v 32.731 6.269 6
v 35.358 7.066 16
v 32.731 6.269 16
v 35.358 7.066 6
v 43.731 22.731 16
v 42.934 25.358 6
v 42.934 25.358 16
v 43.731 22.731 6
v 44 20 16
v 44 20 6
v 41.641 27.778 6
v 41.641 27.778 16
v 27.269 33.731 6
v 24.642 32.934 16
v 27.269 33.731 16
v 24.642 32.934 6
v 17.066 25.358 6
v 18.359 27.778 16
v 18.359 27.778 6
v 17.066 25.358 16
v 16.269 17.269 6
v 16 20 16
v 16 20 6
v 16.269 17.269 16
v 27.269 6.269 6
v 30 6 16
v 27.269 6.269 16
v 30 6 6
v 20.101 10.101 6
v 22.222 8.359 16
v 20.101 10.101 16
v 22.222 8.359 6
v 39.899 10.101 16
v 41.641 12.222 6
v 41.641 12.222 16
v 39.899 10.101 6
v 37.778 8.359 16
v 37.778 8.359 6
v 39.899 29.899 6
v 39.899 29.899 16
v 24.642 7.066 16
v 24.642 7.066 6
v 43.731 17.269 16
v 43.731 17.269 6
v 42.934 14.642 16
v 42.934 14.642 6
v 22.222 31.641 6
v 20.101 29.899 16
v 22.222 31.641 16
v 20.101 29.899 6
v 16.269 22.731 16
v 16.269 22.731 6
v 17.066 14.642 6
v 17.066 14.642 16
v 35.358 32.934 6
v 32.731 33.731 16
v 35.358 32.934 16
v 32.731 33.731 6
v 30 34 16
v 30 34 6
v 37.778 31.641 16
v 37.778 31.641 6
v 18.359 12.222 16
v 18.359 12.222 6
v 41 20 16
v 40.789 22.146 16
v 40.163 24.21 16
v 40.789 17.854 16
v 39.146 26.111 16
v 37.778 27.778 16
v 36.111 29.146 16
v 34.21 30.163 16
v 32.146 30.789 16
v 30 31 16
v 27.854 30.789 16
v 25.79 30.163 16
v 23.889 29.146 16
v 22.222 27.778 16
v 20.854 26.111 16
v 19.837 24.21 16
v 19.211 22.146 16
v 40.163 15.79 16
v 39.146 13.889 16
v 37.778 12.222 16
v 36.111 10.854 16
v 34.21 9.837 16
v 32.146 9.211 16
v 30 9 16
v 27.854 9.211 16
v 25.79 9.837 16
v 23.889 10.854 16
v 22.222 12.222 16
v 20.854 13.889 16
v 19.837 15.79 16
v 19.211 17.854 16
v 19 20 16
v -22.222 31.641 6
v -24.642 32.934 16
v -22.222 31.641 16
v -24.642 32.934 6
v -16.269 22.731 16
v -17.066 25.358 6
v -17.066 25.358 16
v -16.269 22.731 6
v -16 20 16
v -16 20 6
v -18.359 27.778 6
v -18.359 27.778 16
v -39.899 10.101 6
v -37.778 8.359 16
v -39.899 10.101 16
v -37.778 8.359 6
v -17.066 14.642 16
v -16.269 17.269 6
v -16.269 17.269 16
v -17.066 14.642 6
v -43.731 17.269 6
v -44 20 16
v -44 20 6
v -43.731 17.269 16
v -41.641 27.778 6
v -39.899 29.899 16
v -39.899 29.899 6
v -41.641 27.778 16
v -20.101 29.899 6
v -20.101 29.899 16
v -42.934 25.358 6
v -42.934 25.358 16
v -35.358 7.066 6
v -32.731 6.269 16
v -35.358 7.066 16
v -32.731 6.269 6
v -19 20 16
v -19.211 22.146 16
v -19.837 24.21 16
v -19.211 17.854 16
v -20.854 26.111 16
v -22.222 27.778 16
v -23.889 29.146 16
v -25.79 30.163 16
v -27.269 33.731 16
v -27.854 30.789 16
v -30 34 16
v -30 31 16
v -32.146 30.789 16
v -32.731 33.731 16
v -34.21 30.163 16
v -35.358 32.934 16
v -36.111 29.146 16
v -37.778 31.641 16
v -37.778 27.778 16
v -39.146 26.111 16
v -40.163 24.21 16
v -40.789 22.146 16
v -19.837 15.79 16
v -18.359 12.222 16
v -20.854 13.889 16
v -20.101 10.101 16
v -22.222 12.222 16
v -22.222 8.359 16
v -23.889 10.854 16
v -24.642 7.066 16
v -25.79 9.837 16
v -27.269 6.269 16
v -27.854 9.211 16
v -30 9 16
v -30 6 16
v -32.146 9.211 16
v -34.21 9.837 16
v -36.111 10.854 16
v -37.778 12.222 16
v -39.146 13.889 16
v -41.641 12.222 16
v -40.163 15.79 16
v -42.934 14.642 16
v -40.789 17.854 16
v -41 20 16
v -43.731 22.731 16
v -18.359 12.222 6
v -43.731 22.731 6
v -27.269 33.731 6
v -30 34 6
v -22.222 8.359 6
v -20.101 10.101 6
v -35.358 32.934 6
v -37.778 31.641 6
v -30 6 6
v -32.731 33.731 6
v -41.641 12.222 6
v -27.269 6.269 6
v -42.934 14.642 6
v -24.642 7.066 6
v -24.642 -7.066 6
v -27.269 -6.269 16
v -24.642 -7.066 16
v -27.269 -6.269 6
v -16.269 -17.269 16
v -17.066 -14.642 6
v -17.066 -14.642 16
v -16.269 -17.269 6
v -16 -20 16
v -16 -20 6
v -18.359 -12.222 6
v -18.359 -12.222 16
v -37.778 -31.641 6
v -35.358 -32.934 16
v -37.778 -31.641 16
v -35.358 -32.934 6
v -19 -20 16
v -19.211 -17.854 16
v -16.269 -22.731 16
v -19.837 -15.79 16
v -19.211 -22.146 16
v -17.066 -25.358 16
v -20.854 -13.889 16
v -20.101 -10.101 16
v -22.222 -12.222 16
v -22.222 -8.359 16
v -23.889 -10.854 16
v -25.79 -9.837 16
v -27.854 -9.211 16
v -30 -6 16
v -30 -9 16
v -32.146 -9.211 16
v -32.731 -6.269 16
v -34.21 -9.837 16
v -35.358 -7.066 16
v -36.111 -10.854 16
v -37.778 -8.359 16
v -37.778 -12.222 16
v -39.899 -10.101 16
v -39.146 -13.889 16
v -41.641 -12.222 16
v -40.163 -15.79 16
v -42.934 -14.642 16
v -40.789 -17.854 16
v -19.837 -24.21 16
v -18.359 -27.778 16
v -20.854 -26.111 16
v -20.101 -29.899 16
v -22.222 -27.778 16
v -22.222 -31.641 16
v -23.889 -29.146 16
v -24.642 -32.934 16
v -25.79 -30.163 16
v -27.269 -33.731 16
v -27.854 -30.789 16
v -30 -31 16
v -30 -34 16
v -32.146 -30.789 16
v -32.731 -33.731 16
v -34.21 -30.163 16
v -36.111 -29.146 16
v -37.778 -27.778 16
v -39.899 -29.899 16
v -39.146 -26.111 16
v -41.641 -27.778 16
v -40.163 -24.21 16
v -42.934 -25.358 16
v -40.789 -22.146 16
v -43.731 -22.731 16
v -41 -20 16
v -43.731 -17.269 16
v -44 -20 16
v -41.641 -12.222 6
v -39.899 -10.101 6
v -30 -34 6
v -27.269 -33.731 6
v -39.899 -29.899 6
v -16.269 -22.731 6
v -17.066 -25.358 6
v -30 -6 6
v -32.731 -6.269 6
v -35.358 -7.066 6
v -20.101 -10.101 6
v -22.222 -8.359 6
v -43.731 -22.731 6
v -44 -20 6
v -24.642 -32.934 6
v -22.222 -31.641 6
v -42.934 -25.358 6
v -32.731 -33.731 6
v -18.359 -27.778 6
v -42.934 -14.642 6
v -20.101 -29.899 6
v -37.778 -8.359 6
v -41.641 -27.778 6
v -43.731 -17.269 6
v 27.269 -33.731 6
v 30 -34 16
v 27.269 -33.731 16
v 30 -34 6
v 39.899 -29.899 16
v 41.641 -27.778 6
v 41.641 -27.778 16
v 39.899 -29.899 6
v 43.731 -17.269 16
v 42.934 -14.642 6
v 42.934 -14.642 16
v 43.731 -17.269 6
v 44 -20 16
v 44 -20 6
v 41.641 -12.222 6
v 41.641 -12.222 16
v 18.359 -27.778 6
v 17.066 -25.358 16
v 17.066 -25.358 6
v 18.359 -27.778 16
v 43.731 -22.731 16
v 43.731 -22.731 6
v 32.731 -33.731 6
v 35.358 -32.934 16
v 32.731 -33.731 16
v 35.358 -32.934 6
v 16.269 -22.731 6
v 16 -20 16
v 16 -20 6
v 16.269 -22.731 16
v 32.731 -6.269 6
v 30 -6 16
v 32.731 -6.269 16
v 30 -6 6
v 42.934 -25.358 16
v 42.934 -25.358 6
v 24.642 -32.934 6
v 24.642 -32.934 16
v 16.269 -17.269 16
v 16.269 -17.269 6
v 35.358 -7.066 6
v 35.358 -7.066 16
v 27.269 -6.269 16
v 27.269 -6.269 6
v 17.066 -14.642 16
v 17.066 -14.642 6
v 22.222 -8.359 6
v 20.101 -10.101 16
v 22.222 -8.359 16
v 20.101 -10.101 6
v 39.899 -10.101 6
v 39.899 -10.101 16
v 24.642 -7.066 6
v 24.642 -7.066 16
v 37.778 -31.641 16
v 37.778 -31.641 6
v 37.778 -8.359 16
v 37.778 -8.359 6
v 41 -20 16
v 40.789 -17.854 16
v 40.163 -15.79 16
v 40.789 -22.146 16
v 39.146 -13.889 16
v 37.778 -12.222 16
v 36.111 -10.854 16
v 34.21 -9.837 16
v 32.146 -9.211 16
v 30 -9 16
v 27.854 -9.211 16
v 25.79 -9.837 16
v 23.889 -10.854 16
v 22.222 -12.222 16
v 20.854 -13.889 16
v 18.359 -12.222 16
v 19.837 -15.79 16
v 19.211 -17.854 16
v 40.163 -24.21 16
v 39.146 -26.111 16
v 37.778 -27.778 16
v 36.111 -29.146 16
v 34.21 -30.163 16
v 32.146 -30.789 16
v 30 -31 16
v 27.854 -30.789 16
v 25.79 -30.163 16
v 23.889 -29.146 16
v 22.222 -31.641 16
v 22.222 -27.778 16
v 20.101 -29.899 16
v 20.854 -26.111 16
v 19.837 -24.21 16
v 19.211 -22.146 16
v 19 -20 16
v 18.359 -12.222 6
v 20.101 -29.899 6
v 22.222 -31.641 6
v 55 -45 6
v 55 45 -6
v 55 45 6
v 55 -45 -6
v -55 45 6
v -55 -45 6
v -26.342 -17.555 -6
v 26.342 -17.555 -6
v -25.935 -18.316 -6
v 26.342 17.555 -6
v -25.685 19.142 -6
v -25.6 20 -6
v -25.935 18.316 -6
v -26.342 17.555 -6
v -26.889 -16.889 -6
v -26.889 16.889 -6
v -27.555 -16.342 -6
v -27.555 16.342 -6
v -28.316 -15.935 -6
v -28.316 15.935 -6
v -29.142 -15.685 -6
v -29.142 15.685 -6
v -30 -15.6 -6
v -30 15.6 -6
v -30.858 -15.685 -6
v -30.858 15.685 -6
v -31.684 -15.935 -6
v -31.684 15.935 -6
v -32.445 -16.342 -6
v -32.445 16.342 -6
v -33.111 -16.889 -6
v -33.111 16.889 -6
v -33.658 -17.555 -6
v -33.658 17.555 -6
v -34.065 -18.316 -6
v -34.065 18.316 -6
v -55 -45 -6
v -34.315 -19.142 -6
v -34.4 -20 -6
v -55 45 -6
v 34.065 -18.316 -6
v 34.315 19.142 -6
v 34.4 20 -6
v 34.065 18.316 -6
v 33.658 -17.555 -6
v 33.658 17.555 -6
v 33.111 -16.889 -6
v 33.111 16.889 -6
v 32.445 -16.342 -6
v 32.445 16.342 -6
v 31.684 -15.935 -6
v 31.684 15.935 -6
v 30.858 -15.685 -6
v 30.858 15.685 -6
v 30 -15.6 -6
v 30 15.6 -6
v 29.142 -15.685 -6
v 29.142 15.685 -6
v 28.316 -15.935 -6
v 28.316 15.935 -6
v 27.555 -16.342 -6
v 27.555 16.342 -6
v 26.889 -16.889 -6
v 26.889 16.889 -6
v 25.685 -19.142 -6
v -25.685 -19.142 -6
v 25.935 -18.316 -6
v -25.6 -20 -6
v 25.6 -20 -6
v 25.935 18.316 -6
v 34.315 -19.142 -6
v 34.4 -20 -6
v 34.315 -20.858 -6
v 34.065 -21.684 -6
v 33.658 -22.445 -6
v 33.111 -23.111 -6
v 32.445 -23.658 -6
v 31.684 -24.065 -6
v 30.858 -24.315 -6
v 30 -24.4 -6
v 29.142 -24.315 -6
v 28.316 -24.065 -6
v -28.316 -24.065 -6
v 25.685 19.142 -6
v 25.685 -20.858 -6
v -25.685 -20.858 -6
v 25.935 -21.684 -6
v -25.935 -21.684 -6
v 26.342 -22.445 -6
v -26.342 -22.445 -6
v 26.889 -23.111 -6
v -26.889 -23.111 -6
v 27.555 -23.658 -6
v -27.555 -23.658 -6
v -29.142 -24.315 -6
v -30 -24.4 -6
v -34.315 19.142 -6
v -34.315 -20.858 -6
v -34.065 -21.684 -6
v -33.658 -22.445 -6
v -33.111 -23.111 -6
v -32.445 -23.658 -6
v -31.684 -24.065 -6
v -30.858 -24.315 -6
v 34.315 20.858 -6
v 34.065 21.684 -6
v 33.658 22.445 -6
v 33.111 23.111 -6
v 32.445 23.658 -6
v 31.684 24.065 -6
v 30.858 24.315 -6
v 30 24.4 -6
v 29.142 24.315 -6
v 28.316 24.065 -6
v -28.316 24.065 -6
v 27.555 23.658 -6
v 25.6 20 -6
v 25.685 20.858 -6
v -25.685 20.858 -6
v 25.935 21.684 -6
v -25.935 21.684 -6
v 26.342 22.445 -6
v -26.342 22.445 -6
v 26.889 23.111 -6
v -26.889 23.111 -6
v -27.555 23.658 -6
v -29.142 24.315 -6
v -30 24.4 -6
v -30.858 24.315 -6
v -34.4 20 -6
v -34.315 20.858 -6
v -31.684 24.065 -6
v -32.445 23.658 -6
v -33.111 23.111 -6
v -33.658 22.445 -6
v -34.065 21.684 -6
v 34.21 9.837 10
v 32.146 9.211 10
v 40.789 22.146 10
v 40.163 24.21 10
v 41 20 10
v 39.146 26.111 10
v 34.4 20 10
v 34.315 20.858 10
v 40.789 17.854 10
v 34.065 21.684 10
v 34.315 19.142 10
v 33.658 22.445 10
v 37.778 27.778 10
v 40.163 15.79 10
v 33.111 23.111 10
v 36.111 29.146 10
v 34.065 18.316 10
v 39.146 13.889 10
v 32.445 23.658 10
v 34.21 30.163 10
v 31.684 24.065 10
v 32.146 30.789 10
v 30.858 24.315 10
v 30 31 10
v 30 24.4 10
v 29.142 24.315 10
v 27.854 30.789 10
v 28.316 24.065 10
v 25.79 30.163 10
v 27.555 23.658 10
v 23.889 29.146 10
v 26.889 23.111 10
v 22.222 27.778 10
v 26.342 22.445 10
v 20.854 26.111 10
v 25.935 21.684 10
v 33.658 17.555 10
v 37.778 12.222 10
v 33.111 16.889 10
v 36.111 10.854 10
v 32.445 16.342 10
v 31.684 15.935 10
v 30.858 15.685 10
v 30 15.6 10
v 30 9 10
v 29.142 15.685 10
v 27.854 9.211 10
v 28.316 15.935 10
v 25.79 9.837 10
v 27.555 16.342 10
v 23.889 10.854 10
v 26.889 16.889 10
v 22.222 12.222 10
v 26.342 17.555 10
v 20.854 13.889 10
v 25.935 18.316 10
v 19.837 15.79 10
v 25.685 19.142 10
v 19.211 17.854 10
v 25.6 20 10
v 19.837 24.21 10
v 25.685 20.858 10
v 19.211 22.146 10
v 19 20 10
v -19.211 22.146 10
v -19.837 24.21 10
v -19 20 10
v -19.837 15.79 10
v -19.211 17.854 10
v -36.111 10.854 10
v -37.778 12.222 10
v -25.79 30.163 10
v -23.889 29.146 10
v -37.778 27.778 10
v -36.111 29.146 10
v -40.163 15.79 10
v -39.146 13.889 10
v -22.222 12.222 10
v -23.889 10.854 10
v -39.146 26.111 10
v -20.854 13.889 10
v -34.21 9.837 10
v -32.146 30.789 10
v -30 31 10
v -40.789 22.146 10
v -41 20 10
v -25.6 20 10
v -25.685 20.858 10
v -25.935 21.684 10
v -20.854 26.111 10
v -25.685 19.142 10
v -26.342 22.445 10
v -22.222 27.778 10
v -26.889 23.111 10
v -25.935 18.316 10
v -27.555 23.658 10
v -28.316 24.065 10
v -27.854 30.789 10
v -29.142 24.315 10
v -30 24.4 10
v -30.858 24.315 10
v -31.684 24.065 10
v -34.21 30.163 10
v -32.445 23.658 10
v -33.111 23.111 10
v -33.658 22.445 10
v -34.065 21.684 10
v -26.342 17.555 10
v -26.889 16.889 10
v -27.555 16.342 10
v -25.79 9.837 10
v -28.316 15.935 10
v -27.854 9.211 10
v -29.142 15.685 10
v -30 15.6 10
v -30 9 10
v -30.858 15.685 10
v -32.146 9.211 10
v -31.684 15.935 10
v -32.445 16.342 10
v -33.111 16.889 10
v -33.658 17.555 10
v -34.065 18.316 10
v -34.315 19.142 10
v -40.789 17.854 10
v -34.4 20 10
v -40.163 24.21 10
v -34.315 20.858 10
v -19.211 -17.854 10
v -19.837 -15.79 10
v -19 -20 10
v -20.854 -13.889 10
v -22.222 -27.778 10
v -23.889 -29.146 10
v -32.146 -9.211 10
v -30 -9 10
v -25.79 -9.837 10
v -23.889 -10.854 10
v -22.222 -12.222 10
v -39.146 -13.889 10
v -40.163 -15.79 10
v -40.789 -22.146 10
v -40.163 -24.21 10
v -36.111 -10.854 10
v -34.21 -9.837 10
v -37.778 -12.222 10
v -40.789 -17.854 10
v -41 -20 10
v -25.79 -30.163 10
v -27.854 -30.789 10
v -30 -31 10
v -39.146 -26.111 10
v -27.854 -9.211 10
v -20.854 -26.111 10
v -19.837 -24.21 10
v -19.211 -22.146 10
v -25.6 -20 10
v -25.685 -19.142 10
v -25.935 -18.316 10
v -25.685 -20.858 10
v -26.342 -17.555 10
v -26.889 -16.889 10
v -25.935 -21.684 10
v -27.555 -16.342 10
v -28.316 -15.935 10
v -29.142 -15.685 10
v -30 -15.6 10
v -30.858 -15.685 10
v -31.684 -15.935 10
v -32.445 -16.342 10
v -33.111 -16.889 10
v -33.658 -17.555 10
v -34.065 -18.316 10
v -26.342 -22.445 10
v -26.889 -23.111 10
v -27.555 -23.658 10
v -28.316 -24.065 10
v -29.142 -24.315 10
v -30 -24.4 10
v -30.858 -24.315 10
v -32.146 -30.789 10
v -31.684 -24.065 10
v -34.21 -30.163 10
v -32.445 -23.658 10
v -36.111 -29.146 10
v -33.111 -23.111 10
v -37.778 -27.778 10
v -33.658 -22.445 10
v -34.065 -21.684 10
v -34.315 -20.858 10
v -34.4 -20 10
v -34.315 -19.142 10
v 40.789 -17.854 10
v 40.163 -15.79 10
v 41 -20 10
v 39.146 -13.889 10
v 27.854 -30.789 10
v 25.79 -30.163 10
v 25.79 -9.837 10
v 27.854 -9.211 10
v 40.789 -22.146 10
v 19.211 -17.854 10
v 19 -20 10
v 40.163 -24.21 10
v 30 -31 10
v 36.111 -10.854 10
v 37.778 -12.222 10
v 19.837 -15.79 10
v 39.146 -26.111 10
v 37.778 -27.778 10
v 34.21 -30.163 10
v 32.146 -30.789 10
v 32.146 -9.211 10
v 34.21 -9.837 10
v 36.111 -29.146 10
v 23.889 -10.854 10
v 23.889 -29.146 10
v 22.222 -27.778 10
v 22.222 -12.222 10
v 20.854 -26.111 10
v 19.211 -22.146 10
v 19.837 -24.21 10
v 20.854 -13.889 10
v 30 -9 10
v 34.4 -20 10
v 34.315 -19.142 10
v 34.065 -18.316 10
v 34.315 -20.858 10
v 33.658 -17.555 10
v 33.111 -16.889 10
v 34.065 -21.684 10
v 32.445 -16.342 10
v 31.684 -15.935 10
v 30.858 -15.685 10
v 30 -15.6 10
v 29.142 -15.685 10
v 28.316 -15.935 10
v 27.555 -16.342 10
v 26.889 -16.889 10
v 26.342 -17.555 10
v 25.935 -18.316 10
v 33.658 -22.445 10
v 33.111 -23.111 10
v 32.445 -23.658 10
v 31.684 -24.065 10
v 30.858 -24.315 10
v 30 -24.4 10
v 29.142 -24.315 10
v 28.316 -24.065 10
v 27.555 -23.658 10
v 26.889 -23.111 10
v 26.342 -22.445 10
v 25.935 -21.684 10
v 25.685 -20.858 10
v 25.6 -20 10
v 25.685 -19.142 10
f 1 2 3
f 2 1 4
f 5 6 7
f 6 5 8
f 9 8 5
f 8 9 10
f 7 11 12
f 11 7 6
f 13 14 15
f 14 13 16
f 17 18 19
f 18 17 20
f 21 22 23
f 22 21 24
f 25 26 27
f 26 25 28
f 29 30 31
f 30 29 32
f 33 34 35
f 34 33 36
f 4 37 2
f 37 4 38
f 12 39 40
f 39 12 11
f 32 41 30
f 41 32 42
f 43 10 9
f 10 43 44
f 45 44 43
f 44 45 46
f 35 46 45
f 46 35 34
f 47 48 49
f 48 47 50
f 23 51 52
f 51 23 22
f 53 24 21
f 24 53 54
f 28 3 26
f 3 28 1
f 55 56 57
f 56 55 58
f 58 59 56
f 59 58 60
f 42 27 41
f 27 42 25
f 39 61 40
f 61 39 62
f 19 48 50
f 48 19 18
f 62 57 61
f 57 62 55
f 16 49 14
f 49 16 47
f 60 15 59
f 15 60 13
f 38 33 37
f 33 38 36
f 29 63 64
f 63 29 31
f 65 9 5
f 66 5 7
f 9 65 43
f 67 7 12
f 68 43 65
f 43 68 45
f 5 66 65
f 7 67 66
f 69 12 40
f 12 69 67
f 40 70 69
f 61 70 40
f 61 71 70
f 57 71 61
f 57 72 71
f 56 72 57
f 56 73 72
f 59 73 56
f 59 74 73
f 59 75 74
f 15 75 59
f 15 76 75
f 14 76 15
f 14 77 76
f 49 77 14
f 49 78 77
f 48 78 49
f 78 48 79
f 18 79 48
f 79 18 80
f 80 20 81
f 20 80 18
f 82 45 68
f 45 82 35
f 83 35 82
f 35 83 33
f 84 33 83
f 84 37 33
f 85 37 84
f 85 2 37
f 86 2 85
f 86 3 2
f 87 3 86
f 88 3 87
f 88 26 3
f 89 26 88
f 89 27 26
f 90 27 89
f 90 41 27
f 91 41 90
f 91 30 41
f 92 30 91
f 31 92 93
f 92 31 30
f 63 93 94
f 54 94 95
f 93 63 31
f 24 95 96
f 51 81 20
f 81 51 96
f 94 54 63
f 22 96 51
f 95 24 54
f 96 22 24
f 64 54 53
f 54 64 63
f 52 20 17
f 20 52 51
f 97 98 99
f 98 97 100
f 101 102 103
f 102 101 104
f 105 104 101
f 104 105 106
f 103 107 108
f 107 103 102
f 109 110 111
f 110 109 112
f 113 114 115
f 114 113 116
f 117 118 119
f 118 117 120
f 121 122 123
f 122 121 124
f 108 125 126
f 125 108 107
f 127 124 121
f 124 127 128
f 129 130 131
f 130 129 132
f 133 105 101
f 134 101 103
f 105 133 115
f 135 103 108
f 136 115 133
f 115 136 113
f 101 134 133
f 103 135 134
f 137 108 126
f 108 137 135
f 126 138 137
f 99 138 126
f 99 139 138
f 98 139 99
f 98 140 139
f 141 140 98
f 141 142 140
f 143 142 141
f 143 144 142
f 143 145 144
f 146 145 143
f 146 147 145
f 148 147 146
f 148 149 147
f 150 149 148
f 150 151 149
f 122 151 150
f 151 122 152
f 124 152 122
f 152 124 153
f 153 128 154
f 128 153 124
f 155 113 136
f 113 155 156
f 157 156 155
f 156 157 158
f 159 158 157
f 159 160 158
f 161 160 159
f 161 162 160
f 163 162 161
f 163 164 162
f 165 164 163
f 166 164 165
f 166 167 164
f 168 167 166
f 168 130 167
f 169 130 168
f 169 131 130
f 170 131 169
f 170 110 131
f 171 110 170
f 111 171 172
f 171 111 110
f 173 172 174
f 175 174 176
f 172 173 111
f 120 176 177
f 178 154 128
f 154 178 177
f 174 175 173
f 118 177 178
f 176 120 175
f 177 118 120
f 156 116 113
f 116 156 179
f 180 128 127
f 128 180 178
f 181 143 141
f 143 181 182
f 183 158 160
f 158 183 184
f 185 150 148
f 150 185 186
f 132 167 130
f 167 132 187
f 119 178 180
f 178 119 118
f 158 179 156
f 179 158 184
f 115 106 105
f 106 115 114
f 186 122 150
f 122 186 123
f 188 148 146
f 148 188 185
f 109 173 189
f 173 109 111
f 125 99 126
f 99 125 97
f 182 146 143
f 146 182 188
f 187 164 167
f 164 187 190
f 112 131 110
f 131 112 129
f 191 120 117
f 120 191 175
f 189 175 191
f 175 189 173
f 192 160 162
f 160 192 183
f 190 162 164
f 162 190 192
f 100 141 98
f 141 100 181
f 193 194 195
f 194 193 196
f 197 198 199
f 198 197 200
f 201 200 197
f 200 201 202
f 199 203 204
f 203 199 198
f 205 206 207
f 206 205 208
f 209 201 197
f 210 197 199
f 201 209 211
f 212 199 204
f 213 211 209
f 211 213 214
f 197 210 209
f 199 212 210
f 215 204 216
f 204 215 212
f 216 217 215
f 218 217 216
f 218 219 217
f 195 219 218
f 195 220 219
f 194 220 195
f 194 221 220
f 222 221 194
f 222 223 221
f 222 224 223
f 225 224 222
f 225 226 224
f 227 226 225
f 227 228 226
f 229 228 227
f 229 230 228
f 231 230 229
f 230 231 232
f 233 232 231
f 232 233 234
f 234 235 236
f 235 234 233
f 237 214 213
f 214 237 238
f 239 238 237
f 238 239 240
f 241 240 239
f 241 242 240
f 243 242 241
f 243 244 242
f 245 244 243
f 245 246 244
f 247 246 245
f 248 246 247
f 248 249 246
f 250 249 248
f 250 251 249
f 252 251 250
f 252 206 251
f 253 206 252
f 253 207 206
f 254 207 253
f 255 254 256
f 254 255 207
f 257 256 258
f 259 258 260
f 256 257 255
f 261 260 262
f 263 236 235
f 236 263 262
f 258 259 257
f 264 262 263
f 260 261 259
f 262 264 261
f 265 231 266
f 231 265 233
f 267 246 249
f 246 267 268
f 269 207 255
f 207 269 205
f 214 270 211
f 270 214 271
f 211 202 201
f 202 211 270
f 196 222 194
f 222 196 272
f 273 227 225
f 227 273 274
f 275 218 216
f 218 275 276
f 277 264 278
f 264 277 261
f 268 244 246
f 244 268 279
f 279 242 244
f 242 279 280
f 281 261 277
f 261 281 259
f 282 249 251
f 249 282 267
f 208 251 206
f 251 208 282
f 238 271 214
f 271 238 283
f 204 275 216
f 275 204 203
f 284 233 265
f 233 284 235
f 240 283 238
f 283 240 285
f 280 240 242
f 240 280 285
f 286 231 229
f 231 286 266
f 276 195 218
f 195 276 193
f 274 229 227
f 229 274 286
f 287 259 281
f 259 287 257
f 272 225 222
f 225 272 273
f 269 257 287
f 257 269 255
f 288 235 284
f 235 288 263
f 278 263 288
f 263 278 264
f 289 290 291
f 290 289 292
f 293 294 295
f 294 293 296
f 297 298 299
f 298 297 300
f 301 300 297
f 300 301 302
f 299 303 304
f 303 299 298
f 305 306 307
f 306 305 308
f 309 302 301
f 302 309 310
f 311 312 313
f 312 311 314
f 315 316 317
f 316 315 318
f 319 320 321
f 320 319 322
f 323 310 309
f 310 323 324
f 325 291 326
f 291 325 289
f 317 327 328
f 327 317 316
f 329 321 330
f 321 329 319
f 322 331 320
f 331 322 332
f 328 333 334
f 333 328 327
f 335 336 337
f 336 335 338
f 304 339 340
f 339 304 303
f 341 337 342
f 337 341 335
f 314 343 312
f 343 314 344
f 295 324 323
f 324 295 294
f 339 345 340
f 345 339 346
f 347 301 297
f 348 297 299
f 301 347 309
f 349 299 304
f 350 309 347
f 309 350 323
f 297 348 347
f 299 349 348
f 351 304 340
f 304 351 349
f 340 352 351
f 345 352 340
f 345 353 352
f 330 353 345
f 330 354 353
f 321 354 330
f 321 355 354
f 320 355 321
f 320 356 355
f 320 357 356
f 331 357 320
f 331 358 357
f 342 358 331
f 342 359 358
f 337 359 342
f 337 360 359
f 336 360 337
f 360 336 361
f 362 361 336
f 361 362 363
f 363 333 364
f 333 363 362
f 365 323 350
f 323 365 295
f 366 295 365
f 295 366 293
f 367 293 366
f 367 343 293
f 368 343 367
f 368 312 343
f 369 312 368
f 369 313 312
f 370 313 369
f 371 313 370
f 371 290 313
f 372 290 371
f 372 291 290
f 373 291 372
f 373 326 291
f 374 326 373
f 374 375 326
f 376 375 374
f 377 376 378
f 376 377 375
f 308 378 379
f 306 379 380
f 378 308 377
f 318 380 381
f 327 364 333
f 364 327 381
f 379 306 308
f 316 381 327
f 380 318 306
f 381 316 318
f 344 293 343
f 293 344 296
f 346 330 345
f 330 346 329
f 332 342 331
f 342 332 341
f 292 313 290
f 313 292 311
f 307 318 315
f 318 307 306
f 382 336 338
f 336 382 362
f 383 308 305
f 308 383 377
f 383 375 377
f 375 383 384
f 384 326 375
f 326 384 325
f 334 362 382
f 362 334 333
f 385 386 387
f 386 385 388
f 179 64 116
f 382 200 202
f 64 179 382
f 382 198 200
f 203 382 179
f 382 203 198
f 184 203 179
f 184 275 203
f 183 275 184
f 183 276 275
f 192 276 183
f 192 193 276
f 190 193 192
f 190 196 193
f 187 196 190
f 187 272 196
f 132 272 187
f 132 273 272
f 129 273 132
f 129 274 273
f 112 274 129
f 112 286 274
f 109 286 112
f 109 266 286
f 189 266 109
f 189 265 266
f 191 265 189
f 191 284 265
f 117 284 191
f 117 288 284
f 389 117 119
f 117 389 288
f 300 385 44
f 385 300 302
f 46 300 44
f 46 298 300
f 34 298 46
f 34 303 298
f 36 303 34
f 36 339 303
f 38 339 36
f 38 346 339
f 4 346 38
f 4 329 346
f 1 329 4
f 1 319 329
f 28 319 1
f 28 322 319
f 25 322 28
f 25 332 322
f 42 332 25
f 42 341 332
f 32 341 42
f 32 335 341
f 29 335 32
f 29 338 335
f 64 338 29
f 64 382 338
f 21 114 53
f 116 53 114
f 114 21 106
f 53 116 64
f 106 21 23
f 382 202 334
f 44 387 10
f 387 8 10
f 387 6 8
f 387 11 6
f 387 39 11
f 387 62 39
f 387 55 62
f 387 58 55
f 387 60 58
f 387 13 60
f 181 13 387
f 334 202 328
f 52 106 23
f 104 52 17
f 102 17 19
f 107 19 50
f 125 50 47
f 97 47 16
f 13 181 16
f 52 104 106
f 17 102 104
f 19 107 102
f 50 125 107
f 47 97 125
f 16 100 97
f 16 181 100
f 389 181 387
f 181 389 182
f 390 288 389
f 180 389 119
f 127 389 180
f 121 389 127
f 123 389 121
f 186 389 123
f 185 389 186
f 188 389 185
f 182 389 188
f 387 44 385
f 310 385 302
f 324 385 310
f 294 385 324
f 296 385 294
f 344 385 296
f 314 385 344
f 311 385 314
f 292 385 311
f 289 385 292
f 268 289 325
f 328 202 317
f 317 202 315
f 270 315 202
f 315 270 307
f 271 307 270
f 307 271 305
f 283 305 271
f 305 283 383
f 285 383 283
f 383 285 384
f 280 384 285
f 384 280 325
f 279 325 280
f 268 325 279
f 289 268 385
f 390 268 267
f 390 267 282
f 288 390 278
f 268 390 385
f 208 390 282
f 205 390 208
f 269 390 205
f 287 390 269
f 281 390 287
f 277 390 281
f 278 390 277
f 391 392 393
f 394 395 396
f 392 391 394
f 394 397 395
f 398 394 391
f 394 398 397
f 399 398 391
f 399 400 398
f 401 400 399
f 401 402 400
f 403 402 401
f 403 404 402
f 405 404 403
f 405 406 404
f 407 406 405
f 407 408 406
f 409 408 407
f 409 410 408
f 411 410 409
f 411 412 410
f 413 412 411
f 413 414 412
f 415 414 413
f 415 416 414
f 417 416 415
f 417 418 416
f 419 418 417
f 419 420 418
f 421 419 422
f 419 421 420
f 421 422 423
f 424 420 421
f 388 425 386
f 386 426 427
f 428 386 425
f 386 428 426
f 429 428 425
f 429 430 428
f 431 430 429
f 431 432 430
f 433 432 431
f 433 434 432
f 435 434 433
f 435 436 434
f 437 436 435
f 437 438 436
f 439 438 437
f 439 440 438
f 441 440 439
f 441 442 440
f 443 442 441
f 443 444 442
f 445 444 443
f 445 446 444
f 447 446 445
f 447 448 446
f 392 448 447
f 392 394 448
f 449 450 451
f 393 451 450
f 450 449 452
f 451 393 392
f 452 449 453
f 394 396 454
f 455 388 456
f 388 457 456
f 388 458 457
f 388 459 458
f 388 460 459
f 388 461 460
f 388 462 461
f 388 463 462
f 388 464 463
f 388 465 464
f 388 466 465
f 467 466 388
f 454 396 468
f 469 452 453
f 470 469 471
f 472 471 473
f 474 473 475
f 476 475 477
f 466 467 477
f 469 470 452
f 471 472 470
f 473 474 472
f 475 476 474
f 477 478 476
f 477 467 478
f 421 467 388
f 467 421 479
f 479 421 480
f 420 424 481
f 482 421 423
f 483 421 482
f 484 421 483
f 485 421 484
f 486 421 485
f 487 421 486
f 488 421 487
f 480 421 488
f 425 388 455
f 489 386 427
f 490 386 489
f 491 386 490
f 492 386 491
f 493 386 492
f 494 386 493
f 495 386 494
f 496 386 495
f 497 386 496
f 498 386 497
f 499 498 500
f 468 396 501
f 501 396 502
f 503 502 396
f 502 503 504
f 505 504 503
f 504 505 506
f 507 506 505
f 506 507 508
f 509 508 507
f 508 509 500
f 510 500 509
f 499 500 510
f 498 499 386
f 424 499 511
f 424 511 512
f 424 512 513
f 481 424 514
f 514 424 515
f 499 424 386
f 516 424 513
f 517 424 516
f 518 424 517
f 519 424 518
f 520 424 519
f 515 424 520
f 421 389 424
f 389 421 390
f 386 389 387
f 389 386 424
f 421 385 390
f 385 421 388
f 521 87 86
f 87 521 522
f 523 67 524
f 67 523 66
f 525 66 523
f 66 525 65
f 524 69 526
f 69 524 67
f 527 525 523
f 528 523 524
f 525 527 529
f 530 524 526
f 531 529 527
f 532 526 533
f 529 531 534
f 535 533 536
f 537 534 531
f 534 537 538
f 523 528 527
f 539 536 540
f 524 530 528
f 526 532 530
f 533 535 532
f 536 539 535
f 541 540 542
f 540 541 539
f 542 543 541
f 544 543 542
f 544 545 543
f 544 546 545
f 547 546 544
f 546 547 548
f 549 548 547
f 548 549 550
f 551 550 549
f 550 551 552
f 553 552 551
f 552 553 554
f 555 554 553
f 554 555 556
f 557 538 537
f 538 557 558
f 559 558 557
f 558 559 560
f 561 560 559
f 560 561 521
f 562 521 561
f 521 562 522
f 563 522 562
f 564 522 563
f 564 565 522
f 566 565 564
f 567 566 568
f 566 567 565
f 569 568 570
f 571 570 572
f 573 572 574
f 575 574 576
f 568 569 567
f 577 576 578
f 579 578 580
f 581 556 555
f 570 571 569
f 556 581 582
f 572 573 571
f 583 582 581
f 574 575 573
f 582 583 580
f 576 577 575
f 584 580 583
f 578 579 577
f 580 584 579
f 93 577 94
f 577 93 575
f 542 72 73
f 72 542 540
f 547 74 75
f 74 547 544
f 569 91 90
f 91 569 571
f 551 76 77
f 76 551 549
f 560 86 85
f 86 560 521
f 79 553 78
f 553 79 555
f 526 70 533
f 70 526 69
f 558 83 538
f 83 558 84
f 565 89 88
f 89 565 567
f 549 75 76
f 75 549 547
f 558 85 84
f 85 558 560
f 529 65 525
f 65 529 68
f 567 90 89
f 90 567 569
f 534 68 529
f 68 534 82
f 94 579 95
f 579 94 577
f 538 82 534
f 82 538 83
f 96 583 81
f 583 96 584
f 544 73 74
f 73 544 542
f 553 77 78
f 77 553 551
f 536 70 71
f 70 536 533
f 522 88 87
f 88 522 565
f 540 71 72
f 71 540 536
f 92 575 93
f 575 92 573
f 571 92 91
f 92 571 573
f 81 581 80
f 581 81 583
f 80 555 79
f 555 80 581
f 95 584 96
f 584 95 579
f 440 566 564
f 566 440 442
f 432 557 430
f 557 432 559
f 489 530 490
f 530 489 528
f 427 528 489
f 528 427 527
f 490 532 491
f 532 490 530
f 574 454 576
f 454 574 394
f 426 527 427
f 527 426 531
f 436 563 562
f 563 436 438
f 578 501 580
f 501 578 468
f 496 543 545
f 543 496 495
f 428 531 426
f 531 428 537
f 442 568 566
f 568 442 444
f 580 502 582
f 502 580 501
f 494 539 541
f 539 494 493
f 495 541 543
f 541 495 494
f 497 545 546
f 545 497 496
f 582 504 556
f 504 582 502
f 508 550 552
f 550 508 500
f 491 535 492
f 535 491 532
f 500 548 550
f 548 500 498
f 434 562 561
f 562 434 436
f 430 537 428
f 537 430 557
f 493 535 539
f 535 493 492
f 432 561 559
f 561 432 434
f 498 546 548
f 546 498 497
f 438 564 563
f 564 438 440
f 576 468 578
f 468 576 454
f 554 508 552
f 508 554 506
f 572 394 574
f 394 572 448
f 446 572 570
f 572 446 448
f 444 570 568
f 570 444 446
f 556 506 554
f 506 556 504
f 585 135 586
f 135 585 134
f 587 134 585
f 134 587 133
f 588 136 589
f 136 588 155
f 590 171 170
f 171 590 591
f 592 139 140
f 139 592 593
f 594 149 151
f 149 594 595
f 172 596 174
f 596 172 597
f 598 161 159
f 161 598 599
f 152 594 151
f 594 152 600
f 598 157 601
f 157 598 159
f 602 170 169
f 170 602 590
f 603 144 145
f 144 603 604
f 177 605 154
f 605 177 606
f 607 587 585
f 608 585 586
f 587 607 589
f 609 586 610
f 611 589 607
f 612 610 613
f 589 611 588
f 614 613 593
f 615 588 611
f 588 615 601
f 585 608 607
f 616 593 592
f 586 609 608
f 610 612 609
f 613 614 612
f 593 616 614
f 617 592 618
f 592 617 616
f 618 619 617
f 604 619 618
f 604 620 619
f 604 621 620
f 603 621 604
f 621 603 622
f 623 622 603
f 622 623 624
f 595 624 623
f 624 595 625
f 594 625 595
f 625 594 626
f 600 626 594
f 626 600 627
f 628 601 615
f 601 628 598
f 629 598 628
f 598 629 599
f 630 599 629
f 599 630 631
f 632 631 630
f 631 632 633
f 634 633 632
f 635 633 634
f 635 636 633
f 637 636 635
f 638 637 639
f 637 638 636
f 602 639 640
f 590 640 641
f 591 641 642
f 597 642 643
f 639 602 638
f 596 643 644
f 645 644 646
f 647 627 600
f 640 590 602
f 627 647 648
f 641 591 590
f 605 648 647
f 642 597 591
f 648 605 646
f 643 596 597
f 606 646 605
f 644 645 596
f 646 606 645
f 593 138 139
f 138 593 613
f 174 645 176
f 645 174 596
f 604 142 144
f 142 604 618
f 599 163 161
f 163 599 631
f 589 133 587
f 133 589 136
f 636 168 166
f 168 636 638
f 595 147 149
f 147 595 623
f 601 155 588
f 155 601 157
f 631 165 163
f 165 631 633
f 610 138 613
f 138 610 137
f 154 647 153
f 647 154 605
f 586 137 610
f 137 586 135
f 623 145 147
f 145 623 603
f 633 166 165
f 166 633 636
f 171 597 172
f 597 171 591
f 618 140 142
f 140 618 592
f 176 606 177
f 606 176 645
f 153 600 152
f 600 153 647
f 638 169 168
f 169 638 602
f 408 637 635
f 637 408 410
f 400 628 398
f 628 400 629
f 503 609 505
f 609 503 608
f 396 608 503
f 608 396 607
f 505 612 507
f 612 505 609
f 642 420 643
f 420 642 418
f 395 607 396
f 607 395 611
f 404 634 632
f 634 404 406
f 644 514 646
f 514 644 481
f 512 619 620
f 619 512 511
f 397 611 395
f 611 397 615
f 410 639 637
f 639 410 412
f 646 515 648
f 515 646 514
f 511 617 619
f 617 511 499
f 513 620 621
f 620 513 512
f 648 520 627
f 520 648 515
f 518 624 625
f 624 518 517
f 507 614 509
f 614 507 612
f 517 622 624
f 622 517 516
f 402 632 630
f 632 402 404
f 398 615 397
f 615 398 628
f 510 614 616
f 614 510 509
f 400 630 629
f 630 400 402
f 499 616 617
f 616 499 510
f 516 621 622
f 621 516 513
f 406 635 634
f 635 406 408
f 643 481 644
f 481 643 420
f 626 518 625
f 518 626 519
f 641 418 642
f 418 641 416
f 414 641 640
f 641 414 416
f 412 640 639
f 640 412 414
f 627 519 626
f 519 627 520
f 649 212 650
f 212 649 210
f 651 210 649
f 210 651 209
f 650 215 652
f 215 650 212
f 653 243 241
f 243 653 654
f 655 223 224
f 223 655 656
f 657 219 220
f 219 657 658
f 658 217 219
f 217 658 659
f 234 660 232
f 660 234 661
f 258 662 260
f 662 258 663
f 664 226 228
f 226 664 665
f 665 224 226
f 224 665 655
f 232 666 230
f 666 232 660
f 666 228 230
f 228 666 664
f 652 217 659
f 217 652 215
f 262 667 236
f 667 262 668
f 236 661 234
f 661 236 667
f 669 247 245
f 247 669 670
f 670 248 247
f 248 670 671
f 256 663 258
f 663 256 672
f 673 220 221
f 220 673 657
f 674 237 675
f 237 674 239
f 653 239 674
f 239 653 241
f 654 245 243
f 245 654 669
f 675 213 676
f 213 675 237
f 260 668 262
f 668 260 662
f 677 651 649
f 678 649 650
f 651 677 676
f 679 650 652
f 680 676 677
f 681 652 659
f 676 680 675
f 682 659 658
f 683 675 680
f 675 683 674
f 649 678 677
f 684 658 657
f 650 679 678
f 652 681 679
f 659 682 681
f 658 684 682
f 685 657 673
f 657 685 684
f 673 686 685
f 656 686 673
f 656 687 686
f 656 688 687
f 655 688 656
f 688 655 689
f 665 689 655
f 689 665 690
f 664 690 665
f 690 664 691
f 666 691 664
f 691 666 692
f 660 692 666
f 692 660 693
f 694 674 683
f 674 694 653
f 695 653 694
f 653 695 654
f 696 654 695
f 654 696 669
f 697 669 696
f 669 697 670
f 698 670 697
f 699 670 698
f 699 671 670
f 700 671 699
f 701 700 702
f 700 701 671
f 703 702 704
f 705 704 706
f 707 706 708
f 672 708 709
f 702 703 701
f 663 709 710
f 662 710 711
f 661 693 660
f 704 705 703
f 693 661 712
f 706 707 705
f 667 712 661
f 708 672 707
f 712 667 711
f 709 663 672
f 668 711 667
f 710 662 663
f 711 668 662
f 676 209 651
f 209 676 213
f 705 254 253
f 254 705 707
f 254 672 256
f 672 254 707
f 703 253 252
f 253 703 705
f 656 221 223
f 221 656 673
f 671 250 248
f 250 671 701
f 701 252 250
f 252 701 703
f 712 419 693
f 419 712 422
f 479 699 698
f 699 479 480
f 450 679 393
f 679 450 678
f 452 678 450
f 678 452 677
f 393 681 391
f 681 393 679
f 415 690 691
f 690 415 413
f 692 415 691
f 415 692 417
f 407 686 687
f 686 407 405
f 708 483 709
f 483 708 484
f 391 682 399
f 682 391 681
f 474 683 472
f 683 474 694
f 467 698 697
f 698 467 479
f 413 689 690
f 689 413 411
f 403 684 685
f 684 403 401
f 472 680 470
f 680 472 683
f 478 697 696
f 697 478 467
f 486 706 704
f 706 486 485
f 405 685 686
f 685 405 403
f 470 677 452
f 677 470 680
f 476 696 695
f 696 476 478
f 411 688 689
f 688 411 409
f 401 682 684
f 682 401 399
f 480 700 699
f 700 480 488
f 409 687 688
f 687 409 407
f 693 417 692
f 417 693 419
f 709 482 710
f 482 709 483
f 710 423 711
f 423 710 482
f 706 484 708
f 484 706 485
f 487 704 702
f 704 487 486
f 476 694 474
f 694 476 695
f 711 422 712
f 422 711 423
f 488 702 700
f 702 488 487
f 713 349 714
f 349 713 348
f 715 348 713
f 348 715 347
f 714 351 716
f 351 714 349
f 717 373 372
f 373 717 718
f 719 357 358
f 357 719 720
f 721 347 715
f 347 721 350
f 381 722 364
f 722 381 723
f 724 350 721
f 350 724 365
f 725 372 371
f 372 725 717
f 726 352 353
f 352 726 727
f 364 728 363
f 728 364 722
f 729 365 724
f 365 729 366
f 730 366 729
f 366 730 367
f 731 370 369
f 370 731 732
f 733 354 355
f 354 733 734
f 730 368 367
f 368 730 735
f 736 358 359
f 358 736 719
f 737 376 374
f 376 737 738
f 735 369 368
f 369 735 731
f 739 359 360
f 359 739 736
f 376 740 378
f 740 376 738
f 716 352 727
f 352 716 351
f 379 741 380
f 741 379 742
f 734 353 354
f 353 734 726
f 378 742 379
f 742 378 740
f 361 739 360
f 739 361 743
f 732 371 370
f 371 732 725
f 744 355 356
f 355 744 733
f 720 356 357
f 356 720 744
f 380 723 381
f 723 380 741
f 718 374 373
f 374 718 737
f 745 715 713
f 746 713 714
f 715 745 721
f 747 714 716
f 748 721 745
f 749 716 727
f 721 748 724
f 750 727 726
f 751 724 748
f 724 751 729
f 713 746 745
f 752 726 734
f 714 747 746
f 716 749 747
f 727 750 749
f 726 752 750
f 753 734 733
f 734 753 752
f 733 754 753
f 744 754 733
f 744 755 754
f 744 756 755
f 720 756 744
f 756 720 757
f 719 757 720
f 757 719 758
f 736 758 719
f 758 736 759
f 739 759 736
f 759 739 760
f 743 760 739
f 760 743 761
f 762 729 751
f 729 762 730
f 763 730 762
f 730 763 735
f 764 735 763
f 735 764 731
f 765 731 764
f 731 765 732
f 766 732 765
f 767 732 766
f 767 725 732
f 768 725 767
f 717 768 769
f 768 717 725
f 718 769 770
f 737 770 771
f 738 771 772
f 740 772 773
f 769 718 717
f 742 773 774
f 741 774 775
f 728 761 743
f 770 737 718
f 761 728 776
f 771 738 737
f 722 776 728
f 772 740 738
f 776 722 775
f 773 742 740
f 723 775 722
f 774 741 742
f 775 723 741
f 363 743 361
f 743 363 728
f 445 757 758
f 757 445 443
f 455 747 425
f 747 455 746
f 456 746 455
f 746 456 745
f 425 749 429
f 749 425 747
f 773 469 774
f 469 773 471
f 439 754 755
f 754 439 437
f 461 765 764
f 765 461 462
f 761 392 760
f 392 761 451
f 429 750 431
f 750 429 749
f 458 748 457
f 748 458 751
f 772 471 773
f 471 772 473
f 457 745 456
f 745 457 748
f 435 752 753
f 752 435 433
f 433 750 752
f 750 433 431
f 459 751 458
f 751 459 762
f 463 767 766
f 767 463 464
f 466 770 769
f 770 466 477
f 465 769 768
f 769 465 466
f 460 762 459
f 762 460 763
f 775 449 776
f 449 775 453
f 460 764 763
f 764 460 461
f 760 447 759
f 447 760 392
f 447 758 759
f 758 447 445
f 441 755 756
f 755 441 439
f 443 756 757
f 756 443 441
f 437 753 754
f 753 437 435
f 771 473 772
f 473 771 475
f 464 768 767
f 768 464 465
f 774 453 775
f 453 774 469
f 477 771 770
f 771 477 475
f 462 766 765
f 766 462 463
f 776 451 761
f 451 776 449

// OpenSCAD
$fn = 32;

// ----------------------------------------------------------------------
// Socket pad plate
// bosses with counterbored sockets for the screws
// ----------------------------------------------------------------------

// --- parameters (mm) ---
base_t = 12;            // base plate thickness
boss_h = 10;            // boss height above the base plate
boss_d = 28;            // boss diameter
socket_d = 22;          // socket diameter
socket_depth = 6;       // socket depth from the boss face
bolt_d = 8.8;           // screw clearance hole through the socket floor
plate = [110, 90, 12];  // overall size (x, y, z)
edge = 25;              // boss centre offset from the plate edge
pads = 4;               // boss count, one per corner

// --- derived feature positions (mm) ---
height = base_t + boss_h;        // = 22   overall height of the part
corner_x = plate[0] / 2 - edge;  // = 30   boss centre X
corner_y = plate[1] / 2 - edge;  // = 20   boss centre Y
feature_centers = [
  [corner_x, corner_y],
  [-corner_x, corner_y],
  [-corner_x, -corner_y],
  [corner_x, -corner_y]
];   // boss centres: sockets, holes and the pads themselves are placed from here

// base plate, bosses on feature_centers, socket + through hole in each
difference() {
  union() {
    cube(plate, center = true);
    for (centre = feature_centers)
      translate([centre[0], centre[1], plate[2] / 2 - 1])
        cylinder(d = boss_d, h = boss_h + 1);
  }
  for (centre = feature_centers) {
    translate([centre[0], centre[1], plate[2] / 2 + boss_h - socket_depth])
      cylinder(d = socket_d, h = socket_depth + 1);
    translate([centre[0], centre[1], -height])
      cylinder(d = bolt_d, h = 2 * height + 2);  // through the socket floor
  }
}
